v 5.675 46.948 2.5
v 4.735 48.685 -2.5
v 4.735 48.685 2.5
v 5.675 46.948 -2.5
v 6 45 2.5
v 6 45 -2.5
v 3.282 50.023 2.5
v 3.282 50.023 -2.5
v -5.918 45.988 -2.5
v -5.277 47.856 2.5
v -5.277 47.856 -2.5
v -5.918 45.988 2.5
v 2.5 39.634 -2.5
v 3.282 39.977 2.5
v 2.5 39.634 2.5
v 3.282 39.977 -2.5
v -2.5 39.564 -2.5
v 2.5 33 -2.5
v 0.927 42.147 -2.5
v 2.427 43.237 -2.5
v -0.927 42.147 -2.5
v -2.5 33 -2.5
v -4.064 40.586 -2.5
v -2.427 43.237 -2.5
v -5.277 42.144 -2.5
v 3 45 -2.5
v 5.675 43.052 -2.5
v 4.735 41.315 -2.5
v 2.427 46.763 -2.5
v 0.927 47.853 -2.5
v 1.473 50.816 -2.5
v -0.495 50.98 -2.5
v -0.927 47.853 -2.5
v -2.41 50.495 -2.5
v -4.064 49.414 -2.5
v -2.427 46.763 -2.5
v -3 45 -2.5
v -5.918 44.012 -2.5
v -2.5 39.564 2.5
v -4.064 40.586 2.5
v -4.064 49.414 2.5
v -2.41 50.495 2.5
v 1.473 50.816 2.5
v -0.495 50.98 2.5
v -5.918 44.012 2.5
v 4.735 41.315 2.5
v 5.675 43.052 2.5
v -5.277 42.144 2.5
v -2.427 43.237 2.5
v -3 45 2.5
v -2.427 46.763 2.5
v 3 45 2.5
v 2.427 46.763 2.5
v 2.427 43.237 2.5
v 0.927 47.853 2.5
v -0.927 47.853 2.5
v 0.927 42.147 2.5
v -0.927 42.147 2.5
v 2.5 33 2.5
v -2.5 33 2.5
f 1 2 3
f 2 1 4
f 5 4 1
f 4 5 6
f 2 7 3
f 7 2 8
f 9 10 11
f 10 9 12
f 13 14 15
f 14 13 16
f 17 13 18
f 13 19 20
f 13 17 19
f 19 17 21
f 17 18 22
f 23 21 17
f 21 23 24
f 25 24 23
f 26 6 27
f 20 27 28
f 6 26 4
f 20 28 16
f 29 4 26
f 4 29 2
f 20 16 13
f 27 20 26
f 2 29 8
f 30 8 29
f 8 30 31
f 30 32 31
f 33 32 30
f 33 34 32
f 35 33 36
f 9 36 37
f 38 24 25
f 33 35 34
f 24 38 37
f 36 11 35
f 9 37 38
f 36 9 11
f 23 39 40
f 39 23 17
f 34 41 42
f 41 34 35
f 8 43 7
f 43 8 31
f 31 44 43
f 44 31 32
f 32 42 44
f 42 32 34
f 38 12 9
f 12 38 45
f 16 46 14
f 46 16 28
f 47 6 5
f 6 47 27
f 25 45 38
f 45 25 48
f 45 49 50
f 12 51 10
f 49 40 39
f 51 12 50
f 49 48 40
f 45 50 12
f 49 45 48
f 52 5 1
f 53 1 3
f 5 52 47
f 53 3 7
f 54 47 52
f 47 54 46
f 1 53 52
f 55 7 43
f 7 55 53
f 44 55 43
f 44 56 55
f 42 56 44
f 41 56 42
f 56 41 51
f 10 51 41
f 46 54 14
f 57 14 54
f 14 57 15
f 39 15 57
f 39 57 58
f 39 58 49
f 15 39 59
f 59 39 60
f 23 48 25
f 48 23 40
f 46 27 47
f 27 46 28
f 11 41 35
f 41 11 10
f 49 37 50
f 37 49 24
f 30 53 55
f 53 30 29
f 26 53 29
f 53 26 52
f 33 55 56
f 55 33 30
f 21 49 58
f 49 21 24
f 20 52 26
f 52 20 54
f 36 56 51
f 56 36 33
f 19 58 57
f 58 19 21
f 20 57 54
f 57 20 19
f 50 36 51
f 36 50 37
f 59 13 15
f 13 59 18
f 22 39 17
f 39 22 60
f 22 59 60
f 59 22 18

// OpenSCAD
h = 5;
filename = "owl.dxf";
scale = 0.23;

module feature(){
		translate([0,26,0])scale([scale*1.2,scale,1])translate([0,0,-h/2])linear_extrude(height = h) import(filename);
}

module six_feature(){
	union() {
		for(i = [0:360 / 6:360]){
			rotate([0,0,i]) feature();
		}
	}
}

module base(){
	difference(){
		scale([0.7,0.7,1]) translate([0,0,-h/2])linear_extrude(height = h) import("snowflake.dxf");
		cut();
	}
}


module loop() {
	translate([0,45,0]) {
		union(){
			difference() {
				cylinder(h,6,6, center = true);
				cylinder(h,3,3, center = true);
			}
			translate([0,-8,0])cube([5,8,5], center = true);
		}
	}
}

module cut() {
	translate([0,0,-5])
	difference() {
		cylinder(2 * h,80,80);
		cylinder(2 * h,20,20);
	}
}

union() {
	six_feature();
	base();
	loop();
}

//translate([0,0,-5]) color([0,1,0]) cylinder(h,40,40);
